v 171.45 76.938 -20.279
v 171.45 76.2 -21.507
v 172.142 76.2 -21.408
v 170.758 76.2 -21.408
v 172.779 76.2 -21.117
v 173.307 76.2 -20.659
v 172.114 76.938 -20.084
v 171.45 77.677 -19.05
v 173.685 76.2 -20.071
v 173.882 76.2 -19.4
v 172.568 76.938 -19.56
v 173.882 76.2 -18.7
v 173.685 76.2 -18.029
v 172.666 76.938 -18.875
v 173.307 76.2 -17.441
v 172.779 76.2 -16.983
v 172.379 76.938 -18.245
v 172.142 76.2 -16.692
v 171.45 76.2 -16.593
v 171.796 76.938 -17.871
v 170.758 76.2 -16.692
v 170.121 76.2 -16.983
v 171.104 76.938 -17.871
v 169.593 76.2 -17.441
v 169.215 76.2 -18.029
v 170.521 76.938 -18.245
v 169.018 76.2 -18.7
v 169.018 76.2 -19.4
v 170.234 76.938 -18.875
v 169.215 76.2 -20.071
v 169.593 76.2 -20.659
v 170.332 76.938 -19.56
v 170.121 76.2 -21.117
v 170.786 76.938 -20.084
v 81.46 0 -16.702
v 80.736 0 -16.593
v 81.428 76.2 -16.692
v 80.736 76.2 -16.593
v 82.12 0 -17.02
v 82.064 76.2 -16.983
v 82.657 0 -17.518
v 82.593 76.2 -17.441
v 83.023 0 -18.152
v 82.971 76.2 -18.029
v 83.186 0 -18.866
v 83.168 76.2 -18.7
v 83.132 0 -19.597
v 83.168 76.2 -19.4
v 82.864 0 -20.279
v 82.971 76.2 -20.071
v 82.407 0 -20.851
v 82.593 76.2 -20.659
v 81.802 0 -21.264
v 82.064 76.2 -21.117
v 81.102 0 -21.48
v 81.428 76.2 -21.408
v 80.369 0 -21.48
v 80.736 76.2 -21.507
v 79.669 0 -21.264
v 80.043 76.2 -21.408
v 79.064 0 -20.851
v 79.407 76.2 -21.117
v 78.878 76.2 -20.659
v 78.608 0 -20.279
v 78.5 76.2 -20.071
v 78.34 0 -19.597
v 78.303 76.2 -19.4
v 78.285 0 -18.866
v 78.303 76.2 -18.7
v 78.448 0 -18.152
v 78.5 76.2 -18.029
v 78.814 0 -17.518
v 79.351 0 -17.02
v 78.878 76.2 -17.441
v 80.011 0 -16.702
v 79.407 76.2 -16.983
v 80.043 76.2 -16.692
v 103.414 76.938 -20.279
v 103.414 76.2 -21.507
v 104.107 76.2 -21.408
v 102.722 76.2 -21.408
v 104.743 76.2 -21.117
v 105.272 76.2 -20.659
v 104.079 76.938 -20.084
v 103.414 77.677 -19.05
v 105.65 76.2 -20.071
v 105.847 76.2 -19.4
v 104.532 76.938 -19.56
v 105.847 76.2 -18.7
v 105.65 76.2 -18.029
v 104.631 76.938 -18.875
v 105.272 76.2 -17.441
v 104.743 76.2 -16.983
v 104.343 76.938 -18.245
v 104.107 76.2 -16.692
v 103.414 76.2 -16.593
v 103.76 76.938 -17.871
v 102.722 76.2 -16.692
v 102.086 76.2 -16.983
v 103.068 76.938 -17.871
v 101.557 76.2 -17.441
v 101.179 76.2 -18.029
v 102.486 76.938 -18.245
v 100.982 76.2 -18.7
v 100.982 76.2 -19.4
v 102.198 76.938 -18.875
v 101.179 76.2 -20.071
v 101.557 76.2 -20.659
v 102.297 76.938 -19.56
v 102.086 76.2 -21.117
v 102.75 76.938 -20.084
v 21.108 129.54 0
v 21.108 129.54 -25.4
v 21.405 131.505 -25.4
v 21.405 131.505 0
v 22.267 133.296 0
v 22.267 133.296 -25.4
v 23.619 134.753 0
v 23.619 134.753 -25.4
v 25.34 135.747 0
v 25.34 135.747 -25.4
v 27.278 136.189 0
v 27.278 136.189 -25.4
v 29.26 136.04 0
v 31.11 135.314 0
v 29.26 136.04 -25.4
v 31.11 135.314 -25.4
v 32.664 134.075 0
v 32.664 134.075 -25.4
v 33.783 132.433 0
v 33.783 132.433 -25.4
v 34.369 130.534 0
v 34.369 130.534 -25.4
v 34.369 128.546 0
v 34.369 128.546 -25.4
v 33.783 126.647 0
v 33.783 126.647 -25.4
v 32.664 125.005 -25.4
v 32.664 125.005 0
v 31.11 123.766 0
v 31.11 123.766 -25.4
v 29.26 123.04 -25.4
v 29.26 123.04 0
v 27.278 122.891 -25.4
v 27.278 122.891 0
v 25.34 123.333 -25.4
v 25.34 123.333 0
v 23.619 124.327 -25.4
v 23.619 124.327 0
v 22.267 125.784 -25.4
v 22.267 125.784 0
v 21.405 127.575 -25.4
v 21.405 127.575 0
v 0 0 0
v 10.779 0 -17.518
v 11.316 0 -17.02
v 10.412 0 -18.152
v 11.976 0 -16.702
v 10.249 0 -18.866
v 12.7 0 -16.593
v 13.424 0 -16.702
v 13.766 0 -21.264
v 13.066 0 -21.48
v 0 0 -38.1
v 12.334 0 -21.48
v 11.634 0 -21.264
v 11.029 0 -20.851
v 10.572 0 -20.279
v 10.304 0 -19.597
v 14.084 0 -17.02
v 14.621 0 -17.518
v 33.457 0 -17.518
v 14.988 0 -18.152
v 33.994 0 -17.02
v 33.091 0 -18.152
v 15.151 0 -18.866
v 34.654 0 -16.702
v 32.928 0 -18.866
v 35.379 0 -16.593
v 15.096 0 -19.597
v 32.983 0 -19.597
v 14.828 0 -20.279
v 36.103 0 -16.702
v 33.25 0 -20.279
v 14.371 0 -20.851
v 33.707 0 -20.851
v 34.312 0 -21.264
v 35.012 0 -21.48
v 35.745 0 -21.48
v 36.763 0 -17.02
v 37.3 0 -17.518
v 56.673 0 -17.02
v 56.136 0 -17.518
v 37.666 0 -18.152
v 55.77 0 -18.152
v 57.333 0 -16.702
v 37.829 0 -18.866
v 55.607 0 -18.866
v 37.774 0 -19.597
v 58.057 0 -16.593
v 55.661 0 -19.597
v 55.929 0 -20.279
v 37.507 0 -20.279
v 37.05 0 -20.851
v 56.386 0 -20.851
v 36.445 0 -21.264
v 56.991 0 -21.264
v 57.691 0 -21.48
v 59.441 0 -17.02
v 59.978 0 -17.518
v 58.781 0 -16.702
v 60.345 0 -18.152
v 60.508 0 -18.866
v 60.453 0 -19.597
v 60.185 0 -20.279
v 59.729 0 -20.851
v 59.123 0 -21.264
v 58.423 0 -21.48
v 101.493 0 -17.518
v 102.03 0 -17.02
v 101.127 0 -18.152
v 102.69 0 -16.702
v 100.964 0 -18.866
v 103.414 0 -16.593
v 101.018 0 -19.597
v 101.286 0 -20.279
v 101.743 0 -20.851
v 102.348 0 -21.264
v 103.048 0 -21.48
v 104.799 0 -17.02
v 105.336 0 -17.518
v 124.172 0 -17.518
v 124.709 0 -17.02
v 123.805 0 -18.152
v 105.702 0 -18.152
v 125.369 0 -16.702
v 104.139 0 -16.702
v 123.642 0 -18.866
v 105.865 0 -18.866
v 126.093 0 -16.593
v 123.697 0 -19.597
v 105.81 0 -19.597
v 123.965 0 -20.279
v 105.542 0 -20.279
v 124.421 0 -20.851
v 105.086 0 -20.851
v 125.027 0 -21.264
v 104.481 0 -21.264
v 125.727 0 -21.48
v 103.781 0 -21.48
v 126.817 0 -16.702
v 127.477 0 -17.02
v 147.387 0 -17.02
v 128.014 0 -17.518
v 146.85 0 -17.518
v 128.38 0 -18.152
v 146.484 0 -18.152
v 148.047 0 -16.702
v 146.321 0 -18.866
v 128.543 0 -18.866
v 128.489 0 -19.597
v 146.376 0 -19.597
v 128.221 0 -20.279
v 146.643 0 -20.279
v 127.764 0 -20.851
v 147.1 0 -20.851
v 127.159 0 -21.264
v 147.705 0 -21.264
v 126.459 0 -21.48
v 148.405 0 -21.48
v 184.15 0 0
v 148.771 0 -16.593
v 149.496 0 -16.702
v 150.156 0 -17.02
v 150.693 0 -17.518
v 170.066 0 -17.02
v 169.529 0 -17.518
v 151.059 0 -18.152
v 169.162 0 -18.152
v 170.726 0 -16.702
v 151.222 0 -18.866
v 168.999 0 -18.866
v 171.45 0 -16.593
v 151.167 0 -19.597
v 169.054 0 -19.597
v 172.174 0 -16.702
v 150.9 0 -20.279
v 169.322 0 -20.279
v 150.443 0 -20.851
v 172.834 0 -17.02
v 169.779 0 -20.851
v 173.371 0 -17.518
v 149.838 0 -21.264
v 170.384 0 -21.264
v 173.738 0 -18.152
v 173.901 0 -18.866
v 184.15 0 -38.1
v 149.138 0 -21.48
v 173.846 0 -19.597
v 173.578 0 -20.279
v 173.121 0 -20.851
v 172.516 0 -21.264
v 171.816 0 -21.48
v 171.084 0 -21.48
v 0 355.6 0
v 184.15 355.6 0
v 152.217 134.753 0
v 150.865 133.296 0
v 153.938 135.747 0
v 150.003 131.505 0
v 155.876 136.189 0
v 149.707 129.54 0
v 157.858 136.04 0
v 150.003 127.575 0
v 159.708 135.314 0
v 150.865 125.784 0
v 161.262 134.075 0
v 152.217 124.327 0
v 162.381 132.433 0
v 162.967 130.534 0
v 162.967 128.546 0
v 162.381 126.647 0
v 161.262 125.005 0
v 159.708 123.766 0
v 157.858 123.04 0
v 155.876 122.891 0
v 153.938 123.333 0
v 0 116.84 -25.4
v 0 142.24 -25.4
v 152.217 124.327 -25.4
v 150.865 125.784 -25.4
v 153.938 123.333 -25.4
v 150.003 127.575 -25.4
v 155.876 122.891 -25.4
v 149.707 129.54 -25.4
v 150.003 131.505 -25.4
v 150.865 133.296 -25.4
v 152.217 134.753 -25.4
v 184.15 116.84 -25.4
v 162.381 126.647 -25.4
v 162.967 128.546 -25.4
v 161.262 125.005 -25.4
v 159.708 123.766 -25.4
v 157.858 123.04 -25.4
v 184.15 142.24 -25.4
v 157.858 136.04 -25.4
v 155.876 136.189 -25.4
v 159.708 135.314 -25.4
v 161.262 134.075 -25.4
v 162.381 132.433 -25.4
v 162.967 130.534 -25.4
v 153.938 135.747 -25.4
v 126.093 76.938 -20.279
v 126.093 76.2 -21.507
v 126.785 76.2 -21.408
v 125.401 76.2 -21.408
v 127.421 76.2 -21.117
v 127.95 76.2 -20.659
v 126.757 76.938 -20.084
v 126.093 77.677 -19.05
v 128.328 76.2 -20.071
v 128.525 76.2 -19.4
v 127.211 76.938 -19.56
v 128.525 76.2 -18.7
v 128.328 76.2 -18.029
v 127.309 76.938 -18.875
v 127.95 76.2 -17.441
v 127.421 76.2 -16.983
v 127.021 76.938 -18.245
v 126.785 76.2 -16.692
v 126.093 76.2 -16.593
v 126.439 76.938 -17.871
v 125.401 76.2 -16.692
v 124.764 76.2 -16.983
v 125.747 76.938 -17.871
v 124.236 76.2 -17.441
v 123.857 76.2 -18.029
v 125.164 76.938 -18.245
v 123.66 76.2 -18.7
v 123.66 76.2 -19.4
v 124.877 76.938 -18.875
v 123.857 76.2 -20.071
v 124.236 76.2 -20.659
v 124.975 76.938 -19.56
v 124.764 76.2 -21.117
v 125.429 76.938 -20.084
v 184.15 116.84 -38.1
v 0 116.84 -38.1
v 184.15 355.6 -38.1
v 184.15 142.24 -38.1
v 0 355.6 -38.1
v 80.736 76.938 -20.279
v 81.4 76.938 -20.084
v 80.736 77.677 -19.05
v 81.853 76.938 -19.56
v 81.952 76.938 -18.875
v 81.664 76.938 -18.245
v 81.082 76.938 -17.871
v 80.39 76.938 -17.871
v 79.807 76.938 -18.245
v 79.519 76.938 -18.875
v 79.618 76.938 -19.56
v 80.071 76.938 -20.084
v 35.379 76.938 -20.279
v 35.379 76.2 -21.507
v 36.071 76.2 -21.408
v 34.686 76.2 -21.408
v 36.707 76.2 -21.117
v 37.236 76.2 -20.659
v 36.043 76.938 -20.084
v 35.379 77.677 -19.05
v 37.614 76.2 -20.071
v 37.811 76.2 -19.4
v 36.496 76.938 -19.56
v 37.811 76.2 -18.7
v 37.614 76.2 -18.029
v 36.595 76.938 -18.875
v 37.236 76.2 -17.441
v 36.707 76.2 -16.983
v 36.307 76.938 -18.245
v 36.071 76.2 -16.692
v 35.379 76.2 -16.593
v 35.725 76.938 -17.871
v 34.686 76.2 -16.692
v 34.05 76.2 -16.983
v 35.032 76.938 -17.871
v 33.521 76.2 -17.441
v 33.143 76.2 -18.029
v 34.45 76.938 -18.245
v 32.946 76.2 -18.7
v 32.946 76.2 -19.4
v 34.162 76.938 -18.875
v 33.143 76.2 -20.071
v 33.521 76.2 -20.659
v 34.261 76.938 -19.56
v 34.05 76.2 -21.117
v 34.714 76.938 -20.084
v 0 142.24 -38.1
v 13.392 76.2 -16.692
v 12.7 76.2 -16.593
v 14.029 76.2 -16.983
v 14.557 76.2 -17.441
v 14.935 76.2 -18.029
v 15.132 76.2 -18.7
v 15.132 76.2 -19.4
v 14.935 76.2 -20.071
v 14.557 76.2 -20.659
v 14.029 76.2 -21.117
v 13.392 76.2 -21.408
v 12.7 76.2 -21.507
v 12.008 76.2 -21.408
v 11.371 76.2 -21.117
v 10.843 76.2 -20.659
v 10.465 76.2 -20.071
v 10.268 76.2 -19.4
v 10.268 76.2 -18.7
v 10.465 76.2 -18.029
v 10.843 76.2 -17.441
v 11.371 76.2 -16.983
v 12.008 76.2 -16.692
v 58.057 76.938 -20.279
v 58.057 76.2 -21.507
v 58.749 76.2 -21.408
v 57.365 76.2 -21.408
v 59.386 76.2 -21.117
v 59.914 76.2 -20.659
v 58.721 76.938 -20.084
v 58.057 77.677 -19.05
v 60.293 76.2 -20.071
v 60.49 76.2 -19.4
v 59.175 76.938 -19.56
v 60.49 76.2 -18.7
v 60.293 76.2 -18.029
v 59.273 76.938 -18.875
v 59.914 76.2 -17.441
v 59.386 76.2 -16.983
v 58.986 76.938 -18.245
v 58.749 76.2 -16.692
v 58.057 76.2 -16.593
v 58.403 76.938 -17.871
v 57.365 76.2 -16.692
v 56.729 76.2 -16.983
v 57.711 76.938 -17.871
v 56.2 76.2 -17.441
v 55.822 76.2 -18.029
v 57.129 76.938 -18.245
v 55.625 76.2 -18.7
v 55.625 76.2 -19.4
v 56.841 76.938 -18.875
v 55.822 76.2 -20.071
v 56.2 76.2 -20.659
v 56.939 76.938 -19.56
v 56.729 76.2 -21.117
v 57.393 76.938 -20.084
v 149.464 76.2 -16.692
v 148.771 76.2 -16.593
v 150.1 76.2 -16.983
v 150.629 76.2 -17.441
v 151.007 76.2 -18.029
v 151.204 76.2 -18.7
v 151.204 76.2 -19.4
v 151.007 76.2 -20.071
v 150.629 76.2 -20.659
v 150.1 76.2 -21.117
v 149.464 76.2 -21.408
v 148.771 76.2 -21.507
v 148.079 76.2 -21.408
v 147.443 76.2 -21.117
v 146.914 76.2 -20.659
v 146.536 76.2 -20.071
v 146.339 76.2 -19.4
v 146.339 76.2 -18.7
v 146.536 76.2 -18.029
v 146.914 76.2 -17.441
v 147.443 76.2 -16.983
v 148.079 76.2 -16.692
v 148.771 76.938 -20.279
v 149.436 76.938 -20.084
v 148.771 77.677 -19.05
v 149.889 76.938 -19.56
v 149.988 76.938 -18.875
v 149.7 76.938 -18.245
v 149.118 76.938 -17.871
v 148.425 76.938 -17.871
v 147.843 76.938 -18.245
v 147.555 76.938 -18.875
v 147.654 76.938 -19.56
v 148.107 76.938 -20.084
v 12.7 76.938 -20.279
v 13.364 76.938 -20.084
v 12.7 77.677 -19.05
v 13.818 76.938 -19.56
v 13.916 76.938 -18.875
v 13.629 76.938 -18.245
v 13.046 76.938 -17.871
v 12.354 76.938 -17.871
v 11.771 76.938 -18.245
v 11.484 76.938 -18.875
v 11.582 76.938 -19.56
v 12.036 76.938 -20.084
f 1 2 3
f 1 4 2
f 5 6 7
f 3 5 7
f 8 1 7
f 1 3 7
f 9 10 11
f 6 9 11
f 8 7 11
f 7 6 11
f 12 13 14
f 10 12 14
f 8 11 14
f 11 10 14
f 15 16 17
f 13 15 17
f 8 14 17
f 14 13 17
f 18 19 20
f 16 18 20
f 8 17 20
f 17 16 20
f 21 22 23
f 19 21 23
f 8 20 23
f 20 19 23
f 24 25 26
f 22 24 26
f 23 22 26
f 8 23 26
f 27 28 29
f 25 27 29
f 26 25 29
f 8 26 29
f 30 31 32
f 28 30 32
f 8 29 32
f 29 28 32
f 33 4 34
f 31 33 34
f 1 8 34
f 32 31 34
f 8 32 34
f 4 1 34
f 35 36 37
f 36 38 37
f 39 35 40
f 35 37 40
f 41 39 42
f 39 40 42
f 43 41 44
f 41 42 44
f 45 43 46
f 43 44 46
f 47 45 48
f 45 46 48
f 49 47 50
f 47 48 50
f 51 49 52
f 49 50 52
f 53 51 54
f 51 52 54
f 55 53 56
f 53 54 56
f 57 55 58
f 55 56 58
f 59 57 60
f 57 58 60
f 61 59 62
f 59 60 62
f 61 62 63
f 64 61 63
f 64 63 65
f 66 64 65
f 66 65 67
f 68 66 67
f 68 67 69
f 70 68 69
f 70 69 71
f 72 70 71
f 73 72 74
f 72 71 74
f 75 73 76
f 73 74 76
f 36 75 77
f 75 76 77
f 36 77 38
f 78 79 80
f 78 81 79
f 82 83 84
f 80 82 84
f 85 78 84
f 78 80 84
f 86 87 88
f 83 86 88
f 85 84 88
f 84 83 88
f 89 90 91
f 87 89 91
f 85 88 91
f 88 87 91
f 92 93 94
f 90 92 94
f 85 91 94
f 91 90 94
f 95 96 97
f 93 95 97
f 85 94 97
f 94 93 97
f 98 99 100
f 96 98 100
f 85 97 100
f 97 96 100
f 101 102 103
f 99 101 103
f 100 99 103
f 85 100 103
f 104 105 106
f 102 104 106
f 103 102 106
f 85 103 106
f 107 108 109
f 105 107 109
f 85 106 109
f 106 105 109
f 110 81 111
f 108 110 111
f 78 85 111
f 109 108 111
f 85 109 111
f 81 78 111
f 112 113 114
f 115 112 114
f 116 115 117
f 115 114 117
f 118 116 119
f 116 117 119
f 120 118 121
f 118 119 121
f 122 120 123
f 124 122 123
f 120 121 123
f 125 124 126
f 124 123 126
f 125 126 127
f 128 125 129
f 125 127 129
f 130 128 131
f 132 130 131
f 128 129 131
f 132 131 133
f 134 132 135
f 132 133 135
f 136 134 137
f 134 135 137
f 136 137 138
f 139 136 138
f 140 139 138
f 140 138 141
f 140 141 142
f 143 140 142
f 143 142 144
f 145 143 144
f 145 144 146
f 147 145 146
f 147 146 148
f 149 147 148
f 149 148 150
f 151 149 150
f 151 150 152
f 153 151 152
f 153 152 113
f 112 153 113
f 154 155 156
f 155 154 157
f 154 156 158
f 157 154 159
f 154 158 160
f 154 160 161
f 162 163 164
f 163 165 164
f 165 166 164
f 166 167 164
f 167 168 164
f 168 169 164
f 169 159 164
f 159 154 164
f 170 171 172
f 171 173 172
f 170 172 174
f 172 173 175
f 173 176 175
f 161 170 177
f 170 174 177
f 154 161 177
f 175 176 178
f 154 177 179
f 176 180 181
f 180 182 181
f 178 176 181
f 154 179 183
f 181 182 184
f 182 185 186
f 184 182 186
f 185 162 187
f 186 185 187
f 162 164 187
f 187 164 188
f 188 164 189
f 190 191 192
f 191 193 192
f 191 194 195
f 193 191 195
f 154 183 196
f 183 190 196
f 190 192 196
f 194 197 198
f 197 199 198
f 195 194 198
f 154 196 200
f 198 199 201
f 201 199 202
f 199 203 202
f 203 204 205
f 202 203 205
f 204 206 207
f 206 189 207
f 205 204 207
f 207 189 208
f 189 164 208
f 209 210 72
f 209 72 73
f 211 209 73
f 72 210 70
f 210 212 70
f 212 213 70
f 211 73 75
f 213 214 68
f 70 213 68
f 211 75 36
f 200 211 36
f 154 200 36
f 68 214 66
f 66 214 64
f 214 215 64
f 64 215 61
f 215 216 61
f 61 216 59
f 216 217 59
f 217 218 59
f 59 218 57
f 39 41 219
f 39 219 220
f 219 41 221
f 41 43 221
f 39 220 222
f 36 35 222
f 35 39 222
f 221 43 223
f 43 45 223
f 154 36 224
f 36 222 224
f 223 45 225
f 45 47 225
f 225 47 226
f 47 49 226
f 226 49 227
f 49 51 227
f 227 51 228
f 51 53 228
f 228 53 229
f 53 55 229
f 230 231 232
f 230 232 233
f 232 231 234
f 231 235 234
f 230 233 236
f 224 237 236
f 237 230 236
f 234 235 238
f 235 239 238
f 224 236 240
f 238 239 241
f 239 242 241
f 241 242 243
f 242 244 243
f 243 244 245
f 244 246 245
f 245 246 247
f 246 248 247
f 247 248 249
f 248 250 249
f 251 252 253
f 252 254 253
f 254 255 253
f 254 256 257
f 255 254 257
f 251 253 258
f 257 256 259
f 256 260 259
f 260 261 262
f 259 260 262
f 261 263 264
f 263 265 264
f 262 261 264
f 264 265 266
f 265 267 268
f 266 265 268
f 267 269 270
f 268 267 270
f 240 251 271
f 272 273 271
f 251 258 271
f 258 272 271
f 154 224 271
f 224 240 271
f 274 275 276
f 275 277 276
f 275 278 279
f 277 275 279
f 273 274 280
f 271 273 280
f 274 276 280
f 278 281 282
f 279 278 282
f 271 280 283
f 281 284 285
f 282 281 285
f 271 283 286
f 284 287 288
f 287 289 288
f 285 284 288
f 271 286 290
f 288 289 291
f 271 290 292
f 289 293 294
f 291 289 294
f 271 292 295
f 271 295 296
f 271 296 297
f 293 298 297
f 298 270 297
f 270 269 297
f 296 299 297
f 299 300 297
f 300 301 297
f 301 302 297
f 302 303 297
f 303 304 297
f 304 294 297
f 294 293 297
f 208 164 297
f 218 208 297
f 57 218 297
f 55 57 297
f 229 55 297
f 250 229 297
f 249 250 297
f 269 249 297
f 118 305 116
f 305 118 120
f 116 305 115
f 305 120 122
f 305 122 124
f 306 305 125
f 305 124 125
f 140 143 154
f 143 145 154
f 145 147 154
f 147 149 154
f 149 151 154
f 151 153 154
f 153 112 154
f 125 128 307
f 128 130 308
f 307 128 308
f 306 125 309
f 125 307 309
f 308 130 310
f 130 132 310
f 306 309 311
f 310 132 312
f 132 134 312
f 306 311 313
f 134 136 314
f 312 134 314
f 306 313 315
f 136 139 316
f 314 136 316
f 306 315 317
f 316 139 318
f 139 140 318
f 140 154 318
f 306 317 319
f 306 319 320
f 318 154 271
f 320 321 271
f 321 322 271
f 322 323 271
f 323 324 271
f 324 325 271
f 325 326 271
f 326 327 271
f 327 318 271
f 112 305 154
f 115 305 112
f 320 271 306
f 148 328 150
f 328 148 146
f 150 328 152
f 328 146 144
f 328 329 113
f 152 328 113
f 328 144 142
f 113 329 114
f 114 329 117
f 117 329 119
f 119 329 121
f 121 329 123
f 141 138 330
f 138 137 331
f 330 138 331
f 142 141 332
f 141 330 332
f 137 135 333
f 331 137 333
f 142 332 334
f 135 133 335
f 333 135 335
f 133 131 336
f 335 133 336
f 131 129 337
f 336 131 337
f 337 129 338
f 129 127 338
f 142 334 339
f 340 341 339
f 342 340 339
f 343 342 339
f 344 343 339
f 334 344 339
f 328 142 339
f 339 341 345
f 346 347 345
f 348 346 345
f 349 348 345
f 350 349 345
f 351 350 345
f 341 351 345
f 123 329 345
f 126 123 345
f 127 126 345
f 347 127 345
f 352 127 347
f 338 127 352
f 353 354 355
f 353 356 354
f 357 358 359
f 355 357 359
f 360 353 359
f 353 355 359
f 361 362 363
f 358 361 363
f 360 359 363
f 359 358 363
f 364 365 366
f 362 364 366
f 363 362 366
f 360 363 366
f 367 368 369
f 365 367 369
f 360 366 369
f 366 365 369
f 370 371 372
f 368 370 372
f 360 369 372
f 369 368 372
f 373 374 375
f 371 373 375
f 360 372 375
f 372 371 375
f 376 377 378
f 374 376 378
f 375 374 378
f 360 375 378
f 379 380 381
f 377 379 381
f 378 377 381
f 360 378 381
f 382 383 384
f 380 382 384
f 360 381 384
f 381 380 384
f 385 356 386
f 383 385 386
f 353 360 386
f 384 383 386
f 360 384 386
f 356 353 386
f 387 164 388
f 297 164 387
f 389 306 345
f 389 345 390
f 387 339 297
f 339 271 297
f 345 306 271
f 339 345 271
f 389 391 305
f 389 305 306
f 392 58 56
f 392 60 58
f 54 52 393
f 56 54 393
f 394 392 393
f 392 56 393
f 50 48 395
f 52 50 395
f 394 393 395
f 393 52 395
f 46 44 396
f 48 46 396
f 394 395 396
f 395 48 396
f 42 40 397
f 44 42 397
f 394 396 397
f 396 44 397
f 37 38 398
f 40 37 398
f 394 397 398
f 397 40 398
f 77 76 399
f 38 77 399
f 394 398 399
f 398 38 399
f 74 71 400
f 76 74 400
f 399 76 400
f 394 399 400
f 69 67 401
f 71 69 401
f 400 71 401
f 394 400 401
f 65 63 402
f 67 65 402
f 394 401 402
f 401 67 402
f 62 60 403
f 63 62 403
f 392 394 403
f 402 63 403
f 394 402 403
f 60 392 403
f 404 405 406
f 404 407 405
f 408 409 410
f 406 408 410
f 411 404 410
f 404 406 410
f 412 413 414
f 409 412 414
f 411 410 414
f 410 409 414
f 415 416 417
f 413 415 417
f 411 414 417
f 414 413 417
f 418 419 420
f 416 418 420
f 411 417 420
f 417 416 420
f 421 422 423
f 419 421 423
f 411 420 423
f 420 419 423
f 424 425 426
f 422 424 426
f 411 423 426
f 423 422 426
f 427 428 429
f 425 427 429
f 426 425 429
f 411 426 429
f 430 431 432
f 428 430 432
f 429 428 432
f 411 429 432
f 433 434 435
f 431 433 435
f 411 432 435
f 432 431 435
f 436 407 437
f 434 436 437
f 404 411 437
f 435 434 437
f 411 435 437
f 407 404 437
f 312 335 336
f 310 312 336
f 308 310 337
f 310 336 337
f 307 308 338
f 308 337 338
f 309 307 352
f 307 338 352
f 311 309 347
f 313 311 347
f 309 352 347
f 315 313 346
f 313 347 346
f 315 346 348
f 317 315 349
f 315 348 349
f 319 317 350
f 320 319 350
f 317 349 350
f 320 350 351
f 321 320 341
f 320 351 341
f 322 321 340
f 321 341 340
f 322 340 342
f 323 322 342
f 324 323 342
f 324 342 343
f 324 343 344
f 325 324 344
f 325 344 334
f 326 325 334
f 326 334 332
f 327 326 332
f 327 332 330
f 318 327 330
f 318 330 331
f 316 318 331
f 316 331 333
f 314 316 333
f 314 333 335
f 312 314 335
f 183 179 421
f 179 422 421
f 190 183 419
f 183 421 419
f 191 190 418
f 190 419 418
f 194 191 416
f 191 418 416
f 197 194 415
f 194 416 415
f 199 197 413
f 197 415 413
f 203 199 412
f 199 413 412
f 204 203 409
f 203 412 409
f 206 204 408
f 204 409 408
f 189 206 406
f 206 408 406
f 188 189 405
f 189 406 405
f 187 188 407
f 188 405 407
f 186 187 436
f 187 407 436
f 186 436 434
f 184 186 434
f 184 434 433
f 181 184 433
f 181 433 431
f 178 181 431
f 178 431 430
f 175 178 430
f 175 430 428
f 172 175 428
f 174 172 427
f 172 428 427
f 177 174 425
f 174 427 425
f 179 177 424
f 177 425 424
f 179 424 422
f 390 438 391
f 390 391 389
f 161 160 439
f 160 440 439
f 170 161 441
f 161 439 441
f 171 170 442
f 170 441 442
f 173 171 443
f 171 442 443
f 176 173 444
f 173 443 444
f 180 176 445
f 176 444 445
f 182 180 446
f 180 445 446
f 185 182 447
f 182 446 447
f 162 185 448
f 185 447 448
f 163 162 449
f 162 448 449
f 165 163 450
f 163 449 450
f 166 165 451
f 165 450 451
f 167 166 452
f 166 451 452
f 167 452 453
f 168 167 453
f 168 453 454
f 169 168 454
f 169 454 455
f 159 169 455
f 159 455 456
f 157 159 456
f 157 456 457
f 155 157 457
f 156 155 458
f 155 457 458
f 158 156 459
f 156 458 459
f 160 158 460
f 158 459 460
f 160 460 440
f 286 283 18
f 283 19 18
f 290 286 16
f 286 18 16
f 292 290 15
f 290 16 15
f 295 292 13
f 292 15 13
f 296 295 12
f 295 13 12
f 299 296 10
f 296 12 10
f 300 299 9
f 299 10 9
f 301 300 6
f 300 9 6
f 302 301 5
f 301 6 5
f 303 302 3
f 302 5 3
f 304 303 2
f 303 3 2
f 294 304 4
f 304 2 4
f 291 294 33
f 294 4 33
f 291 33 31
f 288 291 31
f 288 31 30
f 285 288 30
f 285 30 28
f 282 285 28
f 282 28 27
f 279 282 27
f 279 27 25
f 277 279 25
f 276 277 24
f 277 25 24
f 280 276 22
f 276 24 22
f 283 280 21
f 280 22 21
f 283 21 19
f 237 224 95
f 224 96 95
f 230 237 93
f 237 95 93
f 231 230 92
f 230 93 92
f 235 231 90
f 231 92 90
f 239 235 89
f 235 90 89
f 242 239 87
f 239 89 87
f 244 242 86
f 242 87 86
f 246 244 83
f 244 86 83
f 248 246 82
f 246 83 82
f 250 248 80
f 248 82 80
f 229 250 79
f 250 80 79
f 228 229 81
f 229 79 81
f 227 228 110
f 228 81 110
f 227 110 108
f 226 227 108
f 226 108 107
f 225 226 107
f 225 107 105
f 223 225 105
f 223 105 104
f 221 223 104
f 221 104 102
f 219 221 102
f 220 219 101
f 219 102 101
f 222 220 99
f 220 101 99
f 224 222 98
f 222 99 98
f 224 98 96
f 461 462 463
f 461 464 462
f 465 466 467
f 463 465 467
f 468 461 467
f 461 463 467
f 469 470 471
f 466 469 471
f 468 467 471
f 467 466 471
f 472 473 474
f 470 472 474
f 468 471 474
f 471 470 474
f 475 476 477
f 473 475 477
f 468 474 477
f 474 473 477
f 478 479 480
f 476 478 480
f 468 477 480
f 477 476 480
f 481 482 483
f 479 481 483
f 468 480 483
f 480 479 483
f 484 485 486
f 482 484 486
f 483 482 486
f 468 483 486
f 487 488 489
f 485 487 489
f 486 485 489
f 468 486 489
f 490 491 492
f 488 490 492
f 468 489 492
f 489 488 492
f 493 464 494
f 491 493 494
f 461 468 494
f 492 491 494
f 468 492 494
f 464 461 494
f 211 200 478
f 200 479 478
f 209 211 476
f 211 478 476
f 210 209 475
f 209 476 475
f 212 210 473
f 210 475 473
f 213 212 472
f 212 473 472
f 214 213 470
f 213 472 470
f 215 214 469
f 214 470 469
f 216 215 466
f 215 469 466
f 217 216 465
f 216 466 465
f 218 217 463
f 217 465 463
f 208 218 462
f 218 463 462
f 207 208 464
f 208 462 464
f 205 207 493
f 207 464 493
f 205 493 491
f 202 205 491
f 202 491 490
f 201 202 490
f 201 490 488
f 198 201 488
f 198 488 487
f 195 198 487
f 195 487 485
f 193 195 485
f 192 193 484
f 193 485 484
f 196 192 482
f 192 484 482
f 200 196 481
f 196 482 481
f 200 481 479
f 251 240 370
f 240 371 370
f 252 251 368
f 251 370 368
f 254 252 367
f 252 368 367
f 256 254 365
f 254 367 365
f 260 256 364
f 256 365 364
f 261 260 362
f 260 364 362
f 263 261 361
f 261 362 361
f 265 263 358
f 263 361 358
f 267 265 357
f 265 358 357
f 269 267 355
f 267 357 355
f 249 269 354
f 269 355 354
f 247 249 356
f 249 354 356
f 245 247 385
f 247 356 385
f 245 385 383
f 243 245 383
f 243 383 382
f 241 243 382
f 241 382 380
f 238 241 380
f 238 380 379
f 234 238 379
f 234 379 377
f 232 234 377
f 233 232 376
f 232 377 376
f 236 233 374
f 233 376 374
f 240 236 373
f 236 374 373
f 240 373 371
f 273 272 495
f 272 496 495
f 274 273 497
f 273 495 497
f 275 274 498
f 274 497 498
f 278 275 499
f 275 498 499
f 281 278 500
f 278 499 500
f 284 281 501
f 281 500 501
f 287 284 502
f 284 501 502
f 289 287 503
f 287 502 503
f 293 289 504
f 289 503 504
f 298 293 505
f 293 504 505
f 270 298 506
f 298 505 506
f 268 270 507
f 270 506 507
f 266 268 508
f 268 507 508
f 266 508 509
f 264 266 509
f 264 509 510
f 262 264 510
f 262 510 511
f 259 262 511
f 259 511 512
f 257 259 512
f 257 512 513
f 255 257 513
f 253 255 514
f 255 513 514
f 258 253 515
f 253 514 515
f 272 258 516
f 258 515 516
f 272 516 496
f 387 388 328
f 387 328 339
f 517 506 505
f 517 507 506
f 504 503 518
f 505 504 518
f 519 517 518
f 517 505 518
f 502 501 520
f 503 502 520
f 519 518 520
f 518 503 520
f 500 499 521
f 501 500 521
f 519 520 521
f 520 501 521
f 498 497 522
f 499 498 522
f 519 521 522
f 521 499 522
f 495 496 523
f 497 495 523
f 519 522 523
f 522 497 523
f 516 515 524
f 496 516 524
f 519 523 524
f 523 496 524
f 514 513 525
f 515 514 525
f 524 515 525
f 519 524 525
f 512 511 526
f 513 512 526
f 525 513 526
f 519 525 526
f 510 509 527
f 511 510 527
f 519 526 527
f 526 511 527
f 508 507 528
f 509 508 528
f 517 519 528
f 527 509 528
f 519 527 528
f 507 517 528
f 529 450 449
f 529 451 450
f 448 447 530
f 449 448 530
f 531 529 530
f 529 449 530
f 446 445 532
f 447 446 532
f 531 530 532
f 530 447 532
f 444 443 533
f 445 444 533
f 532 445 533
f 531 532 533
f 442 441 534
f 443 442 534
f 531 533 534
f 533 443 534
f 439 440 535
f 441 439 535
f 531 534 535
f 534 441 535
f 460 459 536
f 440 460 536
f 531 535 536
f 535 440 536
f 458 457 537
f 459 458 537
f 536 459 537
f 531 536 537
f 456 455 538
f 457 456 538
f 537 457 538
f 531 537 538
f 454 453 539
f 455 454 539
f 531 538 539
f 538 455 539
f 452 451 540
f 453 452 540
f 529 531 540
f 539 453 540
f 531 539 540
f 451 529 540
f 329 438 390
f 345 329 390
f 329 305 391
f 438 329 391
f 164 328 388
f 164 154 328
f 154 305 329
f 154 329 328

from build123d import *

# Parameters (mm, degrees)
SKETCH1_W                        = 184.15
SKETCH1_H                        = 38.1
BOSS_EXTRUDE1_DEPTH              = 355.6
SKETCH2_W                        = 184.15
SKETCH2_H                        = 25.4
CUT_EXTRUDE1_DEPTH               = 12.7
SKETCH3_R                        = 6.6675
CUT_EXTRUDE2_DEPTH               = 13.7
CUT_EXTRUDE2_DEPTH_BACK          = 26.4
F_10_0_1935_DIAMETER_HOLE1_D     = 4.9149
F_10_0_1935_DIAMETER_HOLE1_DEPTH = 76.2
F_10_0_1935_DIAMETER_HOLE1_TIP   = 1.476584928


with BuildPart() as part:
    # Sketch1 → Boss-Extrude1 (new body)
    with BuildSketch(Plane(origin=(0, 0, 0), x_dir=(1, 0, 0), z_dir=(0, 1, 0))):
        with Locations((92.075, 19.05)):
            Rectangle(SKETCH1_W, SKETCH1_H)
    extrude(amount=BOSS_EXTRUDE1_DEPTH)

    # Sketch2 → Cut-Extrude1 (cut)
    with BuildSketch(Plane.XY.offset(-38.1)):
        with Locations((92.075, 129.54)):
            Rectangle(SKETCH2_W, SKETCH2_H)
    extrude(amount=CUT_EXTRUDE1_DEPTH, mode=Mode.SUBTRACT)

    # Sketch3 → Cut-Extrude2 (cut, two sides)
    with BuildSketch(Plane(origin=(0, 0, -25.4), x_dir=(-1, 0, 0), z_dir=(0, 0, -1))) as cut_extrude2_sk:
        with Locations((-156.37405606, 129.54)):
            Circle(SKETCH3_R)
        with Locations((-27.77594394, 129.54)):
            Circle(SKETCH3_R)
    extrude(amount=CUT_EXTRUDE2_DEPTH, mode=Mode.SUBTRACT)
    extrude(cut_extrude2_sk.sketch, amount=-CUT_EXTRUDE2_DEPTH_BACK, mode=Mode.SUBTRACT)

    # #10 (0.1935) Diameter Hole1
    with Locations(Plane(origin=(12.7, 0, -19.05), x_dir=(0, 0, -1), z_dir=(0, -1, 0))):
        with Locations((0, 0), (0, 22.678571429), (0, 45.357142857), (0, 68.035714286), (0, 90.714285714), (0, 113.392857143), (0, 136.071428571), (0, 158.75)):
            Hole(F_10_0_1935_DIAMETER_HOLE1_D / 2, depth=F_10_0_1935_DIAMETER_HOLE1_DEPTH)
            with Locations((0, 0, -(F_10_0_1935_DIAMETER_HOLE1_DEPTH + F_10_0_1935_DIAMETER_HOLE1_TIP / 2))):  # 118° drill point
                Cone(0, F_10_0_1935_DIAMETER_HOLE1_D / 2, F_10_0_1935_DIAMETER_HOLE1_TIP, mode=Mode.SUBTRACT)


solid = part.part
